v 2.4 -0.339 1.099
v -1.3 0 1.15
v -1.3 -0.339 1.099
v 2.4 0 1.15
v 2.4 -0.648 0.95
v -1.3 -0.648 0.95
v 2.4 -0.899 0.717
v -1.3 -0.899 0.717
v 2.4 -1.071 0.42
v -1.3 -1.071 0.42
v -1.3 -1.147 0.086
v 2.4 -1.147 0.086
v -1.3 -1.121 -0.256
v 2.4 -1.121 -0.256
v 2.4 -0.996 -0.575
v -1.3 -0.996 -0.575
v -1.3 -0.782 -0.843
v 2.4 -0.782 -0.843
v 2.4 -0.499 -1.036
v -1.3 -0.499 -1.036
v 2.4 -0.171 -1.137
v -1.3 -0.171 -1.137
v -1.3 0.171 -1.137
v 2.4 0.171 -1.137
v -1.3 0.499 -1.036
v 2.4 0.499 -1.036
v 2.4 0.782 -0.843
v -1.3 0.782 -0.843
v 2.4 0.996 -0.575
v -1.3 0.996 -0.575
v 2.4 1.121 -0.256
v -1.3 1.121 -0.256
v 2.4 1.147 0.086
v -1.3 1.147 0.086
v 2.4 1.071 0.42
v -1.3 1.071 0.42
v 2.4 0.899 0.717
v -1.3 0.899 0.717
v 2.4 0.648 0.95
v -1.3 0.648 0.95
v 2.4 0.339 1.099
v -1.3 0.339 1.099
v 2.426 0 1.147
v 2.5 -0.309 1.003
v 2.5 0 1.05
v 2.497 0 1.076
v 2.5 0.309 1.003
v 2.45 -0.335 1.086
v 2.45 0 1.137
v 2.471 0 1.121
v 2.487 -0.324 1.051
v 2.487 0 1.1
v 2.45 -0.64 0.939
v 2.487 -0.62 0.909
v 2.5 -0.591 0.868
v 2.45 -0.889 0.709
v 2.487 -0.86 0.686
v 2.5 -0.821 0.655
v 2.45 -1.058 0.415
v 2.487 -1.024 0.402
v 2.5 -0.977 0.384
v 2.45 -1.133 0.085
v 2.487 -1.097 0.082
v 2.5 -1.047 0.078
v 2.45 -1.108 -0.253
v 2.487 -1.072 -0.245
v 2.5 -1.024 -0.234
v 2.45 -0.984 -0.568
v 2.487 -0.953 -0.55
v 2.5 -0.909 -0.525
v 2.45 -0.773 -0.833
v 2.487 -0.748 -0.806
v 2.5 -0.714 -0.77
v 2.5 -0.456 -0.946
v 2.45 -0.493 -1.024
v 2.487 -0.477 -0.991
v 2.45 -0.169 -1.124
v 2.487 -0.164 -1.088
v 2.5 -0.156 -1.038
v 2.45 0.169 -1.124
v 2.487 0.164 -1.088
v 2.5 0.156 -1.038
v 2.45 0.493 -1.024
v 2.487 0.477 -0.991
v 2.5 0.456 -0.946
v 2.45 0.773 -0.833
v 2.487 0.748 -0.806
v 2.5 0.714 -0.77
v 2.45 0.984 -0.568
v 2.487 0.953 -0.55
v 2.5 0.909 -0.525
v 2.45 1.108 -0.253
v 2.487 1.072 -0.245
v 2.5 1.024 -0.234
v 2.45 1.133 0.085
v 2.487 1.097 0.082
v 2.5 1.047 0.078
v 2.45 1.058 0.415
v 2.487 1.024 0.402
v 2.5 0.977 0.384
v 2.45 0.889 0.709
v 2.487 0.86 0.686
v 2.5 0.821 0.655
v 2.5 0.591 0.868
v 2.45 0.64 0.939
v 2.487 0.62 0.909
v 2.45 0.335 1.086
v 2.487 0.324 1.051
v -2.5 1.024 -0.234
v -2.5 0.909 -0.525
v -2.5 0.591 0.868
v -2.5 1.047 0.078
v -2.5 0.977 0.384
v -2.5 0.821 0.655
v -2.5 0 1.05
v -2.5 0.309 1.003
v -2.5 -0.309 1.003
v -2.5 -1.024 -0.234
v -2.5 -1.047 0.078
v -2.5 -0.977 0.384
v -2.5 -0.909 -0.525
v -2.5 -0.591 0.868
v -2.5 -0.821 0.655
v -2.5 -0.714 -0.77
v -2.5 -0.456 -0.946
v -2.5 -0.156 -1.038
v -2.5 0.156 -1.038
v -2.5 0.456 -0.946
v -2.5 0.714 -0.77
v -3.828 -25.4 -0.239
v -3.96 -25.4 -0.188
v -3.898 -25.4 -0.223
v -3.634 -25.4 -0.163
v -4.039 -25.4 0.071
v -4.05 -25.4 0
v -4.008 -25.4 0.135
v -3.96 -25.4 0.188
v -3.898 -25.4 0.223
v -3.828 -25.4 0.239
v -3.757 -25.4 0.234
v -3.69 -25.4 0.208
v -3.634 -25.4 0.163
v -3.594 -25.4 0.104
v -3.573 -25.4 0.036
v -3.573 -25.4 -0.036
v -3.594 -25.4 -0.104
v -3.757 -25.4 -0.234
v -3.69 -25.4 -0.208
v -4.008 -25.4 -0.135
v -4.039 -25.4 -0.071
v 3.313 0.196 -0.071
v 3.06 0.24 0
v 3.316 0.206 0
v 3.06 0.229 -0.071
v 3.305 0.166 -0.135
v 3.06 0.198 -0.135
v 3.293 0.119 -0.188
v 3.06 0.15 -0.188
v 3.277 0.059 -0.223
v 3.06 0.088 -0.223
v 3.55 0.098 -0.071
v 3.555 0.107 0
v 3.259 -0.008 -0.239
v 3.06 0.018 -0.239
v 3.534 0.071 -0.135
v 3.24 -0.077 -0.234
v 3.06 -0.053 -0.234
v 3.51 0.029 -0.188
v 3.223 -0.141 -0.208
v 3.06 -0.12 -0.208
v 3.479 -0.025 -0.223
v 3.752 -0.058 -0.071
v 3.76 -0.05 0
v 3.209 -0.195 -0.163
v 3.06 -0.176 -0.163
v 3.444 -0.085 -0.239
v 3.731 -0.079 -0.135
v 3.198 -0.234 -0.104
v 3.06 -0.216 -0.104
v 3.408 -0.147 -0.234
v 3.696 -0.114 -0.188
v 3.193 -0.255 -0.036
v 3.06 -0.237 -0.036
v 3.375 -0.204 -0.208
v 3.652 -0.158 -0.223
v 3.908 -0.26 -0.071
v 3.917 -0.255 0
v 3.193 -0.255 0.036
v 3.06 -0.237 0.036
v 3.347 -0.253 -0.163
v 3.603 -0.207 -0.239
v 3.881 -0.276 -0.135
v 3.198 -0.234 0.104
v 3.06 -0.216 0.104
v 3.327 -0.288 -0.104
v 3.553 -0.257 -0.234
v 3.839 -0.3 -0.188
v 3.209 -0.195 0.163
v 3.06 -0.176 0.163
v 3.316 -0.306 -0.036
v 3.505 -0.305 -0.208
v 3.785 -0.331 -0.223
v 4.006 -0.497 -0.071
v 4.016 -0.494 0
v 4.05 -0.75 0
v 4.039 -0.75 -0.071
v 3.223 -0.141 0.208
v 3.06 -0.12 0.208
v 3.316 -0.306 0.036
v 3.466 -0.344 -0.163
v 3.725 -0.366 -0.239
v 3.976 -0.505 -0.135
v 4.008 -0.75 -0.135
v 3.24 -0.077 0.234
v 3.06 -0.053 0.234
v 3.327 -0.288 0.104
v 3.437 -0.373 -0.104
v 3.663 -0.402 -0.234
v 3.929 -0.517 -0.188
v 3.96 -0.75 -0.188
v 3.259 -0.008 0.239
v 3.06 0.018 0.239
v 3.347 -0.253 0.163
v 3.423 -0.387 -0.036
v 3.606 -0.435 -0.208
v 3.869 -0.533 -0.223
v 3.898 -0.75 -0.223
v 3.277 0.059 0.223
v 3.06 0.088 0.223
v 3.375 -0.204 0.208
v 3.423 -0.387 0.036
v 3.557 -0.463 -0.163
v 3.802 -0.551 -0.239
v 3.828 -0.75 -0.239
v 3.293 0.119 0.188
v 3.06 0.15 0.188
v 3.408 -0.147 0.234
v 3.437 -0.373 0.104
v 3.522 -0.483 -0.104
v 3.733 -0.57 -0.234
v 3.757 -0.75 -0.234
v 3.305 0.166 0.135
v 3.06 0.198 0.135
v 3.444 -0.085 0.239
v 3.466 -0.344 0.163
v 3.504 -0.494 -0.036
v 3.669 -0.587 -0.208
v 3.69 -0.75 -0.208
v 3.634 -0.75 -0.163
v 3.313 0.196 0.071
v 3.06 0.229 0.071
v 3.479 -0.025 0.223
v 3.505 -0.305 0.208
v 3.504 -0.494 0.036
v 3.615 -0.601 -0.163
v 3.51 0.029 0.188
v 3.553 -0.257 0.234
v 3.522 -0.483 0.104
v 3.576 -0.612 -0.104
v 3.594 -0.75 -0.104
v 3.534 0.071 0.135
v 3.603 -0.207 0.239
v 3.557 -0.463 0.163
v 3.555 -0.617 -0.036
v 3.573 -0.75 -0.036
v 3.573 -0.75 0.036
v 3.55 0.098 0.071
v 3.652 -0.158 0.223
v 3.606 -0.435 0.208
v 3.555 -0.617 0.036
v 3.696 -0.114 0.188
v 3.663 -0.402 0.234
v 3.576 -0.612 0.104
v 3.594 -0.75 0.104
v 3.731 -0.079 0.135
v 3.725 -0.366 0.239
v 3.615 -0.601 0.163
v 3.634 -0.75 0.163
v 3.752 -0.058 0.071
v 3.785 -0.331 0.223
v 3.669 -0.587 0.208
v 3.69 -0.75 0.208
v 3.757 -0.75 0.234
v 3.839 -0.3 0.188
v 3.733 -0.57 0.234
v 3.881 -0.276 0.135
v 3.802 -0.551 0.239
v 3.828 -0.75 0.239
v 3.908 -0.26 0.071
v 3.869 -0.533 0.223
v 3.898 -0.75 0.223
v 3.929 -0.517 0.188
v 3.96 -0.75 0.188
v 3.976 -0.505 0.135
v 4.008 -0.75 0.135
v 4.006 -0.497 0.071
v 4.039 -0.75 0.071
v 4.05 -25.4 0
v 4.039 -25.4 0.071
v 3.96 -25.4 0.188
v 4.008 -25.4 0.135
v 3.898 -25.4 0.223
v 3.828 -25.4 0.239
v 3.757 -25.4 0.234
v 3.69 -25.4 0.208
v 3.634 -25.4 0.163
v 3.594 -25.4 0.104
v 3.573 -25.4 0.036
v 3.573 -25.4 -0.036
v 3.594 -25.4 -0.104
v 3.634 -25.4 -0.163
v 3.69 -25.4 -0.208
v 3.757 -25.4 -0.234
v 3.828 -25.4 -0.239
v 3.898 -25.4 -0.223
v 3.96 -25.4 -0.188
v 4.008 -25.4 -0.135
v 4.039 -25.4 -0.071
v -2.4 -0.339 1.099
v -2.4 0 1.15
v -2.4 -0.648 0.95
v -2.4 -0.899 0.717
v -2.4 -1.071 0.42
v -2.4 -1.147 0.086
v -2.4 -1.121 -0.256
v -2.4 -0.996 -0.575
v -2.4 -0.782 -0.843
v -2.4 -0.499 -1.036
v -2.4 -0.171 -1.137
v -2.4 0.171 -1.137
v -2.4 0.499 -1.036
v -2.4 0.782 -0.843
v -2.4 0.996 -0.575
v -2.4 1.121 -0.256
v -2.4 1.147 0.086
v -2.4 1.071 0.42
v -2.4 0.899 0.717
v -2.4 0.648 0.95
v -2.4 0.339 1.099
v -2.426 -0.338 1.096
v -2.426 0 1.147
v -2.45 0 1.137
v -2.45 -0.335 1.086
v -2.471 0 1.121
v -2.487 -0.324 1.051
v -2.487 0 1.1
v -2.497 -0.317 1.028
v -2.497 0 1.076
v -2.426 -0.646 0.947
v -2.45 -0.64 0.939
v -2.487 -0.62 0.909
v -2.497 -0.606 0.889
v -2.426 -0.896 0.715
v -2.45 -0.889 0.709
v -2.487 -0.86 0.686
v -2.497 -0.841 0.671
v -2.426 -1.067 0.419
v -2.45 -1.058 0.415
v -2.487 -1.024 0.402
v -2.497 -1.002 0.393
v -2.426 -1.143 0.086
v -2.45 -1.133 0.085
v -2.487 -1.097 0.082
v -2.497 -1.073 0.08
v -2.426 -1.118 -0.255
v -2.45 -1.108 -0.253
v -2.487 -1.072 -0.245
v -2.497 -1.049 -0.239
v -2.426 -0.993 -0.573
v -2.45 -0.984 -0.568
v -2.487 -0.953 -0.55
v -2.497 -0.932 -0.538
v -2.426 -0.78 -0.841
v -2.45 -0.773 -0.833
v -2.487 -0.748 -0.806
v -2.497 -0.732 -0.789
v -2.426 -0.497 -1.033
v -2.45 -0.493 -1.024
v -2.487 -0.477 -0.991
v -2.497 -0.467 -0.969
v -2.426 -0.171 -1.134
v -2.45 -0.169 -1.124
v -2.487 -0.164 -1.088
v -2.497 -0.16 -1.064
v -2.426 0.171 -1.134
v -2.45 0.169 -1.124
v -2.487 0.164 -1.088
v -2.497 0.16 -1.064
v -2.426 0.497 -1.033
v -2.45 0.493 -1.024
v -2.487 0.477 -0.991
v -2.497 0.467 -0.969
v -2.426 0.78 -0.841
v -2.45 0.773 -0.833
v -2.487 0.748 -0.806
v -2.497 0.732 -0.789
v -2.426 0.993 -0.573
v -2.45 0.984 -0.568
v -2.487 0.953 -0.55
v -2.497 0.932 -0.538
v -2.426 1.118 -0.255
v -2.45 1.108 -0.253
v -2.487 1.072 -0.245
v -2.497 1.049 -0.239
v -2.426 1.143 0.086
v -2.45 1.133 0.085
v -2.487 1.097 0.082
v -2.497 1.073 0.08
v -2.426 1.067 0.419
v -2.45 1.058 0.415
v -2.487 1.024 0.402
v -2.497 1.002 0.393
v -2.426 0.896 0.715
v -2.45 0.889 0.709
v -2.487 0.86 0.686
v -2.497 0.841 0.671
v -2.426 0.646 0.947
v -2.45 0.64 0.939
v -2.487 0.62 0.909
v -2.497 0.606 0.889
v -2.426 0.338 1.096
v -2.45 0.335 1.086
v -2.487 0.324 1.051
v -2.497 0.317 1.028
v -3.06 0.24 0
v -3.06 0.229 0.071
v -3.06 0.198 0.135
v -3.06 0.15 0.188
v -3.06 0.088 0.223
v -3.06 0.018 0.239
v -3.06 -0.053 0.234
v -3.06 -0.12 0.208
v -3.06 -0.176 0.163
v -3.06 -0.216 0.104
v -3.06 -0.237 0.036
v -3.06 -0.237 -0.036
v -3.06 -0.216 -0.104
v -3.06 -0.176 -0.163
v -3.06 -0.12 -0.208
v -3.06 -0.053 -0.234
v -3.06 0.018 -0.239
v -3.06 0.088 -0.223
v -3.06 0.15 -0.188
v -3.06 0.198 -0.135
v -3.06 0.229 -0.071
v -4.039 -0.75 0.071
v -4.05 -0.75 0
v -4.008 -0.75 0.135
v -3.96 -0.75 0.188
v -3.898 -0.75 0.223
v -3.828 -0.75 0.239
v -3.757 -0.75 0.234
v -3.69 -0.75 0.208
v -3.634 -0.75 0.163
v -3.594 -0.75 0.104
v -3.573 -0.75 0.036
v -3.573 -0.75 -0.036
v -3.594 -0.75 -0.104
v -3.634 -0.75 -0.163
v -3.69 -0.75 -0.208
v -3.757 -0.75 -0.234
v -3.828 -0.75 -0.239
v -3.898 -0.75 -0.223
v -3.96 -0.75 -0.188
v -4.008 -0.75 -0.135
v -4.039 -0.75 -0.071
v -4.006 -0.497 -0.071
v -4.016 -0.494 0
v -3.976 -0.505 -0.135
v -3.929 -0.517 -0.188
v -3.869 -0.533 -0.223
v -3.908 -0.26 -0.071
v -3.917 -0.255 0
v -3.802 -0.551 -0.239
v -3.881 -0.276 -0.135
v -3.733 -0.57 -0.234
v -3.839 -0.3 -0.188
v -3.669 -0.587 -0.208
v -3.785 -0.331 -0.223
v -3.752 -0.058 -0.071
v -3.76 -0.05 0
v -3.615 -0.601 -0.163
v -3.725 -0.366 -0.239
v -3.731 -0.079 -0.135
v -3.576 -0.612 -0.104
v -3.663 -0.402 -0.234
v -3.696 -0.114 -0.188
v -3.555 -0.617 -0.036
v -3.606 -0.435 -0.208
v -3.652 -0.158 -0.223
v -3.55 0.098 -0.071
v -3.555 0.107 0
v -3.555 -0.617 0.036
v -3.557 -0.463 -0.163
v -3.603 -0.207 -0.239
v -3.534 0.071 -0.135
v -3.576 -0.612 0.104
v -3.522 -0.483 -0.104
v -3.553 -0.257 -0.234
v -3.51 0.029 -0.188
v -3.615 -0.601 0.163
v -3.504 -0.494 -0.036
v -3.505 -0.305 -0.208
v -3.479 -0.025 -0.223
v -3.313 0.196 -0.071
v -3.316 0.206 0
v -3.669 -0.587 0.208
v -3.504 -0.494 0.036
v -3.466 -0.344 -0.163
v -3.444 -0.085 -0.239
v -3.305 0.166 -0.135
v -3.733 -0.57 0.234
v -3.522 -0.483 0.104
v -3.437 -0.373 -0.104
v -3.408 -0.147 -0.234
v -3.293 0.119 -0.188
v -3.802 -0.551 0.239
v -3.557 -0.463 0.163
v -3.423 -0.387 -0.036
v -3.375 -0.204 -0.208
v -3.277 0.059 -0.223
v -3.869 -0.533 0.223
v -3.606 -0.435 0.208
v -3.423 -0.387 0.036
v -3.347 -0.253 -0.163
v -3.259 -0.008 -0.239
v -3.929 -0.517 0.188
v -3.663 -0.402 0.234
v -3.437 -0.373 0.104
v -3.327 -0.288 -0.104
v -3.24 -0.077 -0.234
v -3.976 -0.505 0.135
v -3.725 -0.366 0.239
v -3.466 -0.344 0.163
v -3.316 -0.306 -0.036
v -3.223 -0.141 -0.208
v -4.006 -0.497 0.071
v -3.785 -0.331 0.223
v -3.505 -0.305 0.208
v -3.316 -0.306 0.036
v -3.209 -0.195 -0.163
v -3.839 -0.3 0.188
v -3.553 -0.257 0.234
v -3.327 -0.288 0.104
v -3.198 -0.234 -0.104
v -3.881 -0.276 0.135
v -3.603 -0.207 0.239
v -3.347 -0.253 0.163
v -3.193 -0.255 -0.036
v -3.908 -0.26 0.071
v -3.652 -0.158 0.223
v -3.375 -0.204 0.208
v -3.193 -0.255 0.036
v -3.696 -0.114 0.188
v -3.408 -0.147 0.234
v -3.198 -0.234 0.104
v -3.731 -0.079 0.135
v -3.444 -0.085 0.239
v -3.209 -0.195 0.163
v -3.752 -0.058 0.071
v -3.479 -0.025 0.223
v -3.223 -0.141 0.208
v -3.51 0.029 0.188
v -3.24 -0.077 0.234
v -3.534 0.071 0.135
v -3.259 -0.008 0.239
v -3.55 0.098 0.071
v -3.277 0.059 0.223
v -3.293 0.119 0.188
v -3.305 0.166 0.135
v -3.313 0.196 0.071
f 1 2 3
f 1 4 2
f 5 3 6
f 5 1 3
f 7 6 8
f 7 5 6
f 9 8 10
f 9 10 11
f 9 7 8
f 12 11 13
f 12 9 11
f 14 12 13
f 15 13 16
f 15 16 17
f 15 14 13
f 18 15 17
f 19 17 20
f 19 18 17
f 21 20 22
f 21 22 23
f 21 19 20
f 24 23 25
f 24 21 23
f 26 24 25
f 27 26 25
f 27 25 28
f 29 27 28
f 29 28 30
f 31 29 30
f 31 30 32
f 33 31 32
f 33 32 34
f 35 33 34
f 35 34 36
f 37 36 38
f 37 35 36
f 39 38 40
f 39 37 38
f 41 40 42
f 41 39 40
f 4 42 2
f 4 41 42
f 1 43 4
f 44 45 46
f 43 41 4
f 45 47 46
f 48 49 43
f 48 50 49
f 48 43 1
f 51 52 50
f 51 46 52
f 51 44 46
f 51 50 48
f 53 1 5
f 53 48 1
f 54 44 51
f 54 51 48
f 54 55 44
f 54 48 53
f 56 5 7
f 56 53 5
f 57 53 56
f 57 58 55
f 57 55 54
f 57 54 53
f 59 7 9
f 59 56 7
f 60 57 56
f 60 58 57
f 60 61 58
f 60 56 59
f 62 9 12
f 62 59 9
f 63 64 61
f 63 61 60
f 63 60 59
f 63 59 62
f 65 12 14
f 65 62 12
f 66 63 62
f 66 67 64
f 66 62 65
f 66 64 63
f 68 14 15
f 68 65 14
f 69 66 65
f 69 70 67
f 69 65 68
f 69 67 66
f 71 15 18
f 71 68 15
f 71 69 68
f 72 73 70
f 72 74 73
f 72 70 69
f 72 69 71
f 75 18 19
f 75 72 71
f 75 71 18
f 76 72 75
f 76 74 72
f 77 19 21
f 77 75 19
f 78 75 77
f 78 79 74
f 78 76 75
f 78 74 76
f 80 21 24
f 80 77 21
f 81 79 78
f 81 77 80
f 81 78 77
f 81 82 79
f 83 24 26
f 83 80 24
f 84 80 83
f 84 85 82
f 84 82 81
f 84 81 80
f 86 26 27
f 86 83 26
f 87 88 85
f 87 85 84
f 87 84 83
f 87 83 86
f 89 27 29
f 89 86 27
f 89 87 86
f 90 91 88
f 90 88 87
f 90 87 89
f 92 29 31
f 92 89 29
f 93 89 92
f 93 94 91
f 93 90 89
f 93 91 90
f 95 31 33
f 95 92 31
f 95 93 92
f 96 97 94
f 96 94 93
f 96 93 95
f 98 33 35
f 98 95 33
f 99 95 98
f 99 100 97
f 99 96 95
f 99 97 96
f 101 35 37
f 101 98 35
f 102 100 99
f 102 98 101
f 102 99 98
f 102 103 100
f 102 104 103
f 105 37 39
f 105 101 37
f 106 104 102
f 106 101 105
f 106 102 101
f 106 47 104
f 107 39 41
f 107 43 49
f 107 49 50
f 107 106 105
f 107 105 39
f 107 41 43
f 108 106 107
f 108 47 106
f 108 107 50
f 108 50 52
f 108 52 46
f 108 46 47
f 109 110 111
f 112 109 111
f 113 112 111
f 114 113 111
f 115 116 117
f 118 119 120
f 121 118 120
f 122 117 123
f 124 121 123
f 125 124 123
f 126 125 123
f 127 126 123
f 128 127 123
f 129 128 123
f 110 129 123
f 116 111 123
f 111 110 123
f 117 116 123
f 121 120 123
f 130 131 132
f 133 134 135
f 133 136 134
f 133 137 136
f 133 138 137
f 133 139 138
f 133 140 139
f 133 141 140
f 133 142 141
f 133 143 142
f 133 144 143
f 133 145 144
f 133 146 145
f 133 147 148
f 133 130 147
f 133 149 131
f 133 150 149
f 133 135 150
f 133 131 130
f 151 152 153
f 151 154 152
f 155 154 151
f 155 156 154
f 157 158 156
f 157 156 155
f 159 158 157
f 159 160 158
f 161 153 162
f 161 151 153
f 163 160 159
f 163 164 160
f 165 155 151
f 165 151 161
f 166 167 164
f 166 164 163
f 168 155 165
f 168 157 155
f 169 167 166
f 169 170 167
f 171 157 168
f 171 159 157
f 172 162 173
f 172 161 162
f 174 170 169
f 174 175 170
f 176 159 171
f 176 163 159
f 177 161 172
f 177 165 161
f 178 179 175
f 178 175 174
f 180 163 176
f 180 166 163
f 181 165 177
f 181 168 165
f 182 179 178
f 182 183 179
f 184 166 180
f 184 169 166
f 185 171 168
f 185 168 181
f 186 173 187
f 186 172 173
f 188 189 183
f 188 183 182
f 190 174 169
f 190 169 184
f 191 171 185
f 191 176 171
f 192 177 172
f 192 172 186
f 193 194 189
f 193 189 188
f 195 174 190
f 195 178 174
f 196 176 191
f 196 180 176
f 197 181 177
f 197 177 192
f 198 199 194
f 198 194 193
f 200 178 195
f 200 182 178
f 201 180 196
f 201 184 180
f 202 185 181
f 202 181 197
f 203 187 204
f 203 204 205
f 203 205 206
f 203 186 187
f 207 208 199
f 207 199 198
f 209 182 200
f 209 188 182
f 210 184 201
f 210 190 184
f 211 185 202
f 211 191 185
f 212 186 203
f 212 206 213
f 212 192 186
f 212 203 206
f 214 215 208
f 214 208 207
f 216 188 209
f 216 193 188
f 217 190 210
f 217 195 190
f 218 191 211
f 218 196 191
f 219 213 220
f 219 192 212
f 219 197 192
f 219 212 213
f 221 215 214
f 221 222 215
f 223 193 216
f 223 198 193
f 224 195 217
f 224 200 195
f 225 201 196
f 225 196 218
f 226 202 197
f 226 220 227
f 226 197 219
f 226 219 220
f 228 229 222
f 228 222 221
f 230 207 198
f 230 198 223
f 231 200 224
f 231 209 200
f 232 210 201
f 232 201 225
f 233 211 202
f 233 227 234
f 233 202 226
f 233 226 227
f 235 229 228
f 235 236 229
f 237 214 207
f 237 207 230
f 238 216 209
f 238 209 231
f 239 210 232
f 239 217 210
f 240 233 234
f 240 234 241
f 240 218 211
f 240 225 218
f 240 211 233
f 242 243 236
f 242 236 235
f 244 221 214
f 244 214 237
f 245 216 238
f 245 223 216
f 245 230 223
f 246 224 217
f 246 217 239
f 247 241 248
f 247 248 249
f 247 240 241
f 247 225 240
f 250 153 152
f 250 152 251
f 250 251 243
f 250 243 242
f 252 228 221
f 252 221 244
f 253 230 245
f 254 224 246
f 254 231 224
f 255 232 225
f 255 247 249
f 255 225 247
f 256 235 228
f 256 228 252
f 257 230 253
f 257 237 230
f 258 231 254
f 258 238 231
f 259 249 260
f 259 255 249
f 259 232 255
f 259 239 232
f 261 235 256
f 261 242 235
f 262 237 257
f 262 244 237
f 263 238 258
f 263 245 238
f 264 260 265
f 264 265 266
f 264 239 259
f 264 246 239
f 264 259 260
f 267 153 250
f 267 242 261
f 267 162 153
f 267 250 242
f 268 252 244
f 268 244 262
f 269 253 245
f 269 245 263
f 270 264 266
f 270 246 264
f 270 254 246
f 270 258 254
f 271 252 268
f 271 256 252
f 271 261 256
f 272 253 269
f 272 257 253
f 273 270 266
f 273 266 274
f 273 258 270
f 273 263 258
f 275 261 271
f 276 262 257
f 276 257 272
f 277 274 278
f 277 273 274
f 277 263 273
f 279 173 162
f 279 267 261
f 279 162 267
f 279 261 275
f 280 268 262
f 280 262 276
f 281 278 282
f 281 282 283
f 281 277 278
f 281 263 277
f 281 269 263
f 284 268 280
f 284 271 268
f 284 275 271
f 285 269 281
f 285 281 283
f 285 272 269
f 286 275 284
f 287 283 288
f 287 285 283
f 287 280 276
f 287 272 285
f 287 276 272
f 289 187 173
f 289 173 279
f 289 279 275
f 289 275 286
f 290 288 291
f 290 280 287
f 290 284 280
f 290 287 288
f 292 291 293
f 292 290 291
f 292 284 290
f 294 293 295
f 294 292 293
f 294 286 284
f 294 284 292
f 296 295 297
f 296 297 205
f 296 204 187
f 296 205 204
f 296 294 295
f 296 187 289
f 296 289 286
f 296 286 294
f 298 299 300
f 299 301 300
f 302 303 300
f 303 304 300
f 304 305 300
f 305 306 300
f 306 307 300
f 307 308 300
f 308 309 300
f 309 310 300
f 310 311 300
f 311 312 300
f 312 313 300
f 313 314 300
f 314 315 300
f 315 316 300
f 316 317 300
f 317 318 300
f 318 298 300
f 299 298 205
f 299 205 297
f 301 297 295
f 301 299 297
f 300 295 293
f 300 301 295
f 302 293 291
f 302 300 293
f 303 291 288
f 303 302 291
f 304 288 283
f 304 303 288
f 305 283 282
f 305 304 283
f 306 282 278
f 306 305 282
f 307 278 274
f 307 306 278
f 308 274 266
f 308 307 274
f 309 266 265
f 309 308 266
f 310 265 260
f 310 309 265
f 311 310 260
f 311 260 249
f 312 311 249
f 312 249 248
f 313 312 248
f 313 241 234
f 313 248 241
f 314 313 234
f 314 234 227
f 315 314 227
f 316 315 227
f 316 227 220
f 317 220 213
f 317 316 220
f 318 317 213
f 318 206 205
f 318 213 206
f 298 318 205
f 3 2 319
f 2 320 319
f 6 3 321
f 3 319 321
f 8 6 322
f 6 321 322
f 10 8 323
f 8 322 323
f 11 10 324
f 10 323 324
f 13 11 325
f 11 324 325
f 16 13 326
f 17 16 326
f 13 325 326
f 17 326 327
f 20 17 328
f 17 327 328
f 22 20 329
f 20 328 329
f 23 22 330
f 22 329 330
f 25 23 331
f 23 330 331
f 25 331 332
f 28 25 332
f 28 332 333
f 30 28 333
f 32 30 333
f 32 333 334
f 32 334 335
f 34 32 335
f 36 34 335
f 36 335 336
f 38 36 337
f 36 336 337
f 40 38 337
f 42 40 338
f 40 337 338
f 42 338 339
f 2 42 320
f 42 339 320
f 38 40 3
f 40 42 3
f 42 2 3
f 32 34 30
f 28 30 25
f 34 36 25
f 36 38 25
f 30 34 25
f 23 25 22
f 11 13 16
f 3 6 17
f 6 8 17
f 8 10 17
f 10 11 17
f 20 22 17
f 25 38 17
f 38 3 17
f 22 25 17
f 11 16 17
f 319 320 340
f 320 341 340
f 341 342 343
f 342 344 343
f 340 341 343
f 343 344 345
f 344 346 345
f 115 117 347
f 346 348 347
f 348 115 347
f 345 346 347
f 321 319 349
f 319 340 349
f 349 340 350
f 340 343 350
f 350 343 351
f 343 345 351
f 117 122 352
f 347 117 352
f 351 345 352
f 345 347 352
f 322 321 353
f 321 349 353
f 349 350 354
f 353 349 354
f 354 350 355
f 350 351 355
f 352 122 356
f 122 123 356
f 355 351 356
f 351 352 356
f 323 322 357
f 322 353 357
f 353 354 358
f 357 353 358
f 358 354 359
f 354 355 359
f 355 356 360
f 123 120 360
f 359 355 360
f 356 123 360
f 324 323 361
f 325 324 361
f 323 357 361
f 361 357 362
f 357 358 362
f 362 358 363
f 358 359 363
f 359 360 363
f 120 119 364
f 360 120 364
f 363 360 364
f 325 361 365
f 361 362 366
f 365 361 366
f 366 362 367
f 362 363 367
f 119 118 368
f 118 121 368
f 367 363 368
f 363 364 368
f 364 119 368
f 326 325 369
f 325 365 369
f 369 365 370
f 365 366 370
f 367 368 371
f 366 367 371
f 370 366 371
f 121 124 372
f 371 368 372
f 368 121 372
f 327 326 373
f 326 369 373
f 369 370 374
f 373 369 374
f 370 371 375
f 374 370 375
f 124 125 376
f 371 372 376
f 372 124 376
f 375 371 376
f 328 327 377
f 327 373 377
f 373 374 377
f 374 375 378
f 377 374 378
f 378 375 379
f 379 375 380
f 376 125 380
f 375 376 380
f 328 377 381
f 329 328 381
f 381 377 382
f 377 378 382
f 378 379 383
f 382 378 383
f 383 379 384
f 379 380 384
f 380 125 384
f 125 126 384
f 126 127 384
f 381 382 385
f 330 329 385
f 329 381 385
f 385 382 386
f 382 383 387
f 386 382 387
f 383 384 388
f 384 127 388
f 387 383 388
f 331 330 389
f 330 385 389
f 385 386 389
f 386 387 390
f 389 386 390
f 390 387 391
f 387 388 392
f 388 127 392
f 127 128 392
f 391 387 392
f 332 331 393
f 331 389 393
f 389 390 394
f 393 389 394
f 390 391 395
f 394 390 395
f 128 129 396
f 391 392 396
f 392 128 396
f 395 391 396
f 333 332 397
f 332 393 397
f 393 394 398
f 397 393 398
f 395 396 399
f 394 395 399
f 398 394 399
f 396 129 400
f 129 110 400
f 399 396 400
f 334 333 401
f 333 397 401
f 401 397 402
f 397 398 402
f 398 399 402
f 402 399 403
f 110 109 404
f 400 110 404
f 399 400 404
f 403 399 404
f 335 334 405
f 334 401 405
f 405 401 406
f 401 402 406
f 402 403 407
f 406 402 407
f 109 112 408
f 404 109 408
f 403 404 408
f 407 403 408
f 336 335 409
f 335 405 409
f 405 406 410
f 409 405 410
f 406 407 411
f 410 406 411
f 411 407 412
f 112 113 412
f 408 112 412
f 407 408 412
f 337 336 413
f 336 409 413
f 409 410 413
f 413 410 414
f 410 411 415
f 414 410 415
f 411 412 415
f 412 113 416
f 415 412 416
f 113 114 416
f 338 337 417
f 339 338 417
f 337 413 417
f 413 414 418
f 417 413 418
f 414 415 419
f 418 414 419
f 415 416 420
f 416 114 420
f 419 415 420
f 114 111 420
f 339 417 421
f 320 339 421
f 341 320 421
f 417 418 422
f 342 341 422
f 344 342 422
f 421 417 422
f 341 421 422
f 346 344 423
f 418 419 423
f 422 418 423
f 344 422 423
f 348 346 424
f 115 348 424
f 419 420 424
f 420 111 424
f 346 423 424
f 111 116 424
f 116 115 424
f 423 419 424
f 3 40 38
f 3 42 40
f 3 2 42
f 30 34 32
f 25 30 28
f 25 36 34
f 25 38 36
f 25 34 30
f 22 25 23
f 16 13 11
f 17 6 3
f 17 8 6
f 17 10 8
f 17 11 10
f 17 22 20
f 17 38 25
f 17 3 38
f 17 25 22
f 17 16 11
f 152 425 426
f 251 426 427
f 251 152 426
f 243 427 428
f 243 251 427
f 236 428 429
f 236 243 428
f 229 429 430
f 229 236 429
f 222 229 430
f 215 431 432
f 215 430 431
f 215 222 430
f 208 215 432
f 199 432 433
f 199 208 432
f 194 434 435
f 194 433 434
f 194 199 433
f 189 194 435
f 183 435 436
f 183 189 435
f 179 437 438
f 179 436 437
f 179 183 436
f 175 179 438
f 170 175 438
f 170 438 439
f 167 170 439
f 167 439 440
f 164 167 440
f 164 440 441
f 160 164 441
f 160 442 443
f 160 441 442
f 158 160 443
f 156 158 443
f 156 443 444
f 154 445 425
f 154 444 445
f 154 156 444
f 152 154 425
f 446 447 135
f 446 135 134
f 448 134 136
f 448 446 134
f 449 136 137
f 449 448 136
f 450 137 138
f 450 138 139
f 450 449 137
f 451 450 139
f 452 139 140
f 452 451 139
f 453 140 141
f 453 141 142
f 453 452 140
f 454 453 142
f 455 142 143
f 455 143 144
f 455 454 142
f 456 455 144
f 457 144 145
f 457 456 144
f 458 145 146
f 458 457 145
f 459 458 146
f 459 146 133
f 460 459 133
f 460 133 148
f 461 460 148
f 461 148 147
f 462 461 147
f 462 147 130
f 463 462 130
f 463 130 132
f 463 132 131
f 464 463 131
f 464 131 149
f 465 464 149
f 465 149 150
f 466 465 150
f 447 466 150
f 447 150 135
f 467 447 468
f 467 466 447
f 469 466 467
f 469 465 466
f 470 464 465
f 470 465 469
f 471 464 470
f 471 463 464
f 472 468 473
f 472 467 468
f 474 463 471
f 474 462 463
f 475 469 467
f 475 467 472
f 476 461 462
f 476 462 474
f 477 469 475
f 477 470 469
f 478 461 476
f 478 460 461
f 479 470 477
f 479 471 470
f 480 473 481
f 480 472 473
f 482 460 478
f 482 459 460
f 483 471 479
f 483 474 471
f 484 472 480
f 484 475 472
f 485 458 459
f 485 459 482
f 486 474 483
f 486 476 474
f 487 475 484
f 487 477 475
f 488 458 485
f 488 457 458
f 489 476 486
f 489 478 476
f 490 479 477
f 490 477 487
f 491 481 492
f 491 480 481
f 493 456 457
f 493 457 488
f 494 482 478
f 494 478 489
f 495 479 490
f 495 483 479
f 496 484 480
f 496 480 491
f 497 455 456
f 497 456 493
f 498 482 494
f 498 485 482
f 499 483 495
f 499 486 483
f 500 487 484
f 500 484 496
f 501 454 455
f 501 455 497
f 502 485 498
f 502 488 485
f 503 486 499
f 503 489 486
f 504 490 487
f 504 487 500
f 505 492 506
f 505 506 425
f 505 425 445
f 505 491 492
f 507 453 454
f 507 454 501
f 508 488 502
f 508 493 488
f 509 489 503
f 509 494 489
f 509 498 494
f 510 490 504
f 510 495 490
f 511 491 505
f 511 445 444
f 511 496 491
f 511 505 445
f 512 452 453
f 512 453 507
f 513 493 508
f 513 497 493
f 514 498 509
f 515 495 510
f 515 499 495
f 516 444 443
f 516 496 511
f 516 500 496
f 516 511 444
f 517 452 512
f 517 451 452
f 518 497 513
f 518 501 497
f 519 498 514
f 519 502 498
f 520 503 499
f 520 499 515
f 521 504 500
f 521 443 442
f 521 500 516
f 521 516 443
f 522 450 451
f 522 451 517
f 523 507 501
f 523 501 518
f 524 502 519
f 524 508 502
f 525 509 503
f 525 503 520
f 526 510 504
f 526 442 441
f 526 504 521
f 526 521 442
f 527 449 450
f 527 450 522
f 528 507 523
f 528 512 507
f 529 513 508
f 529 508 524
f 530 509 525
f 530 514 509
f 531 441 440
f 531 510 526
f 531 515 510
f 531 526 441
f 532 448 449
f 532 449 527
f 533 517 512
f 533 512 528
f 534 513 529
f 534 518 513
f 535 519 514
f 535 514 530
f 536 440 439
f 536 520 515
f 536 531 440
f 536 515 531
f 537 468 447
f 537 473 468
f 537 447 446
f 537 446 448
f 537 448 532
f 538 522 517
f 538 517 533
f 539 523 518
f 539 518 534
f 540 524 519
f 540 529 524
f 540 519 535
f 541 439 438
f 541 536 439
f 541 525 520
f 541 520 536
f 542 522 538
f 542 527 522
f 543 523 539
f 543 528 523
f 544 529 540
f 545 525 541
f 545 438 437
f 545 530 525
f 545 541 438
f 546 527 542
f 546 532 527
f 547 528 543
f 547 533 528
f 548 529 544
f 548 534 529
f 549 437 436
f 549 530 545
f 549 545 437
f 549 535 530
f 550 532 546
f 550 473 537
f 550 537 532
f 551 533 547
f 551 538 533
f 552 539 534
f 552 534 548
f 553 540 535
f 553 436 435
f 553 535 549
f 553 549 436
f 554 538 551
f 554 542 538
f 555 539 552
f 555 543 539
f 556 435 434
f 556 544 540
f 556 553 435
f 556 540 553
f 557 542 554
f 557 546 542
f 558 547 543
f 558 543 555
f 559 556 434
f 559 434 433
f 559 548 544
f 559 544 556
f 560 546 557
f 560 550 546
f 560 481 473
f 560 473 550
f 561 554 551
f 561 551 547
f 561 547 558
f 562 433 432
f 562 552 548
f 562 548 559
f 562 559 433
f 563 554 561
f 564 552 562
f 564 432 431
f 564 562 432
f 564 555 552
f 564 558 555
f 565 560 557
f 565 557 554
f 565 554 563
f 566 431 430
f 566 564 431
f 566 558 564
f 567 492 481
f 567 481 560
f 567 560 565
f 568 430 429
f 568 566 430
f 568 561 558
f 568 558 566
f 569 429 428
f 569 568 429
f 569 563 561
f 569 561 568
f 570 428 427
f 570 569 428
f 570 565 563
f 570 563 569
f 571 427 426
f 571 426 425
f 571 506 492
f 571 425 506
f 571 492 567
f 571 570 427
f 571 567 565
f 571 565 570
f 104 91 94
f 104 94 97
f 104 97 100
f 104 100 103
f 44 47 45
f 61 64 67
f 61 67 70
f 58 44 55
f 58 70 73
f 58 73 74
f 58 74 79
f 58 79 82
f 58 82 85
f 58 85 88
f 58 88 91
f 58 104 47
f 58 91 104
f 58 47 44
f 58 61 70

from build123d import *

# Parameters (mm, degrees)
SKETCH2_R = 0.24


with BuildPart() as part:
    # Sweep1: sweep along a path in Sketch1
    with BuildLine(Plane.XY) as sweep1_path:
        Line((-3.81, -25.4), (-3.81, -0.75))
        ThreePointArc((-3.81, -0.75), (-3.590330086, -0.219669914), (-3.06, 0))
        Line((-3.06, 0), (3.06, 0))
        ThreePointArc((3.06, 0), (3.590330086, -0.219669914), (3.81, -0.75))
        Line((3.81, -0.75), (3.81, -25.4))
    # Sketch2 → Sweep1 (sweep)
    with BuildSketch(Plane(origin=(-3.81, -25.4, 0), x_dir=(-1, 0, 0), z_dir=(0, -1, 0))):
        Circle(SKETCH2_R)
    sweep(path=sweep1_path.line)


with BuildPart() as body_2:
    # Sketch3 → Revolve1 (revolve)
    with BuildSketch(Plane.XY, mode=Mode.PRIVATE) as revolve1_sk:
        with BuildLine():
            Line((-1.3, 1.15), (2.4, 1.15))
            ThreePointArc((2.4, 1.15), (2.470710678, 1.120710678), (2.5, 1.05))
            Line((2.5, 1.05), (2.5, 0))
            Line((2.5, 0), (-1.3, 0))
            Line((-1.3, 0), (-1.3, 1.15))
        make_face()
    revolve(revolve1_sk.sketch.rotate(Axis((-1.3, 0, 0), (1, 0, 0)), 90), axis=Axis((-1.3, 0, 0), (1, 0, 0)))


with BuildPart() as body_3:
    # Sketch4 → Revolve2 (revolve)
    with BuildSketch(Plane.XY, mode=Mode.PRIVATE) as revolve2_sk:
        with BuildLine():
            Line((-2.5, 1.05), (-2.5, 0))
            Line((-2.5, 0), (-1.3, 0))
            Line((-1.3, 0), (-1.3, 1.15))
            Line((-1.3, 1.15), (-2.4, 1.15))
            ThreePointArc((-2.4, 1.15), (-2.470710678, 1.120710678), (-2.5, 1.05))
        make_face()
    revolve(revolve2_sk.sketch.rotate(Axis((-2.5, 0, 0), (1, 0, 0)), 90), axis=Axis((-2.5, 0, 0), (1, 0, 0)))


solid = Compound([part.part, body_2.part, body_3.part])
